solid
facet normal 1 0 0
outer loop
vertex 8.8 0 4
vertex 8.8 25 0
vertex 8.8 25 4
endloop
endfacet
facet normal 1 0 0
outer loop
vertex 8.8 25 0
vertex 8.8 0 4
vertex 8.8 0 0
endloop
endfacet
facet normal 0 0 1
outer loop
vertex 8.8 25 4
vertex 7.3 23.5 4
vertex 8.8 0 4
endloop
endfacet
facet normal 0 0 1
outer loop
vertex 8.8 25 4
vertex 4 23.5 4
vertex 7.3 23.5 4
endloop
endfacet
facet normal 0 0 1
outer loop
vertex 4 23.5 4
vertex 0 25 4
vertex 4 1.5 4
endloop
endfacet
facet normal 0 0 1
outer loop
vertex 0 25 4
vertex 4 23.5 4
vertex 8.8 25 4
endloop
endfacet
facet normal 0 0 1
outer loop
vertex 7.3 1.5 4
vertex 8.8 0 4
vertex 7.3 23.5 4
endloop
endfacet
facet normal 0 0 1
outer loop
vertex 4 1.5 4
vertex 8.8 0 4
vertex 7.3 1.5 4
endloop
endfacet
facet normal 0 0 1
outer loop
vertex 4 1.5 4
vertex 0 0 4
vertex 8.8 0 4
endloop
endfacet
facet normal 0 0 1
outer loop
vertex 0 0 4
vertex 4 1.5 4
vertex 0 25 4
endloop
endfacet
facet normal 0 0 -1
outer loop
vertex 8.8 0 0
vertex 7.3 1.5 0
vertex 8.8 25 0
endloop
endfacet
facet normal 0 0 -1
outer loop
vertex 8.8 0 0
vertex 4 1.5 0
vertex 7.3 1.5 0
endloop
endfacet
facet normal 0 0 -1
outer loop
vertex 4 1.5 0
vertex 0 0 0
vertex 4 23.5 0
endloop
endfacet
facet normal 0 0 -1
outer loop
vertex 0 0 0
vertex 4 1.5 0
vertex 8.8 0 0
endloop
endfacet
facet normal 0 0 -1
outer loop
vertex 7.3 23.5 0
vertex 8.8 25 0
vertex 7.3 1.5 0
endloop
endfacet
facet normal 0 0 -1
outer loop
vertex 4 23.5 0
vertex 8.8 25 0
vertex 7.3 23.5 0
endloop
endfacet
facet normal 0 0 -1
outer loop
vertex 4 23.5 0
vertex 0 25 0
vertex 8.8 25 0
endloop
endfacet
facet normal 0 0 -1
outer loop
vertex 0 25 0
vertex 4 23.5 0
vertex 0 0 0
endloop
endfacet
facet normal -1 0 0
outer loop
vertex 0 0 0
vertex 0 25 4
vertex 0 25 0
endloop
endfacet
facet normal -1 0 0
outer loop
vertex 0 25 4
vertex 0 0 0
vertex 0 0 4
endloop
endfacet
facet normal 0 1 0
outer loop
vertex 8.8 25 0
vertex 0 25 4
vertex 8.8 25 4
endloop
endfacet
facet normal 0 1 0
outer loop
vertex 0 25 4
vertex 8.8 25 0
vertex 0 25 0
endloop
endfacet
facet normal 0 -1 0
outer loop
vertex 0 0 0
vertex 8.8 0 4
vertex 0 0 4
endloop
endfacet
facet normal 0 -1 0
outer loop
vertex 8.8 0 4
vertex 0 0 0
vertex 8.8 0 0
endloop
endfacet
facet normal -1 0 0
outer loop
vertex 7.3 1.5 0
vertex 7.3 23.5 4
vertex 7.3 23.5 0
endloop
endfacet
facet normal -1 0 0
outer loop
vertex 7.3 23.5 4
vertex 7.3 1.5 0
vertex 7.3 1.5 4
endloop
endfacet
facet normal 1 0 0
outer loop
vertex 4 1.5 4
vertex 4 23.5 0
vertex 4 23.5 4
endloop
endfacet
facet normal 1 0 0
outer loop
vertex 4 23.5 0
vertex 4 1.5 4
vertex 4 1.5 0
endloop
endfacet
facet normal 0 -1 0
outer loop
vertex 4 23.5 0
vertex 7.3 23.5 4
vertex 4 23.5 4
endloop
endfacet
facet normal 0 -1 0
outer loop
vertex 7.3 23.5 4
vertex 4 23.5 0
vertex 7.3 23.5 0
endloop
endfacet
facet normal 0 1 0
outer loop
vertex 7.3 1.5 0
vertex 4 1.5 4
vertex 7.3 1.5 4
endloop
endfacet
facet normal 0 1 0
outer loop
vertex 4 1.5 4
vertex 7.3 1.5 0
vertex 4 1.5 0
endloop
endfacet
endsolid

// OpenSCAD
// The amount of adjustment to make to the X-axis
x_amount = 4;
// The thickness of the rest of the piece
th = 1.5;

// The piece on the MPSM that will hold this model.
module support(){
    cube([3.3, 22, 5]);
}

difference() {
    cube([x_amount+3.3+th, 22+th*2, 4]);
    translate([x_amount, th, -.5]) support();
}
